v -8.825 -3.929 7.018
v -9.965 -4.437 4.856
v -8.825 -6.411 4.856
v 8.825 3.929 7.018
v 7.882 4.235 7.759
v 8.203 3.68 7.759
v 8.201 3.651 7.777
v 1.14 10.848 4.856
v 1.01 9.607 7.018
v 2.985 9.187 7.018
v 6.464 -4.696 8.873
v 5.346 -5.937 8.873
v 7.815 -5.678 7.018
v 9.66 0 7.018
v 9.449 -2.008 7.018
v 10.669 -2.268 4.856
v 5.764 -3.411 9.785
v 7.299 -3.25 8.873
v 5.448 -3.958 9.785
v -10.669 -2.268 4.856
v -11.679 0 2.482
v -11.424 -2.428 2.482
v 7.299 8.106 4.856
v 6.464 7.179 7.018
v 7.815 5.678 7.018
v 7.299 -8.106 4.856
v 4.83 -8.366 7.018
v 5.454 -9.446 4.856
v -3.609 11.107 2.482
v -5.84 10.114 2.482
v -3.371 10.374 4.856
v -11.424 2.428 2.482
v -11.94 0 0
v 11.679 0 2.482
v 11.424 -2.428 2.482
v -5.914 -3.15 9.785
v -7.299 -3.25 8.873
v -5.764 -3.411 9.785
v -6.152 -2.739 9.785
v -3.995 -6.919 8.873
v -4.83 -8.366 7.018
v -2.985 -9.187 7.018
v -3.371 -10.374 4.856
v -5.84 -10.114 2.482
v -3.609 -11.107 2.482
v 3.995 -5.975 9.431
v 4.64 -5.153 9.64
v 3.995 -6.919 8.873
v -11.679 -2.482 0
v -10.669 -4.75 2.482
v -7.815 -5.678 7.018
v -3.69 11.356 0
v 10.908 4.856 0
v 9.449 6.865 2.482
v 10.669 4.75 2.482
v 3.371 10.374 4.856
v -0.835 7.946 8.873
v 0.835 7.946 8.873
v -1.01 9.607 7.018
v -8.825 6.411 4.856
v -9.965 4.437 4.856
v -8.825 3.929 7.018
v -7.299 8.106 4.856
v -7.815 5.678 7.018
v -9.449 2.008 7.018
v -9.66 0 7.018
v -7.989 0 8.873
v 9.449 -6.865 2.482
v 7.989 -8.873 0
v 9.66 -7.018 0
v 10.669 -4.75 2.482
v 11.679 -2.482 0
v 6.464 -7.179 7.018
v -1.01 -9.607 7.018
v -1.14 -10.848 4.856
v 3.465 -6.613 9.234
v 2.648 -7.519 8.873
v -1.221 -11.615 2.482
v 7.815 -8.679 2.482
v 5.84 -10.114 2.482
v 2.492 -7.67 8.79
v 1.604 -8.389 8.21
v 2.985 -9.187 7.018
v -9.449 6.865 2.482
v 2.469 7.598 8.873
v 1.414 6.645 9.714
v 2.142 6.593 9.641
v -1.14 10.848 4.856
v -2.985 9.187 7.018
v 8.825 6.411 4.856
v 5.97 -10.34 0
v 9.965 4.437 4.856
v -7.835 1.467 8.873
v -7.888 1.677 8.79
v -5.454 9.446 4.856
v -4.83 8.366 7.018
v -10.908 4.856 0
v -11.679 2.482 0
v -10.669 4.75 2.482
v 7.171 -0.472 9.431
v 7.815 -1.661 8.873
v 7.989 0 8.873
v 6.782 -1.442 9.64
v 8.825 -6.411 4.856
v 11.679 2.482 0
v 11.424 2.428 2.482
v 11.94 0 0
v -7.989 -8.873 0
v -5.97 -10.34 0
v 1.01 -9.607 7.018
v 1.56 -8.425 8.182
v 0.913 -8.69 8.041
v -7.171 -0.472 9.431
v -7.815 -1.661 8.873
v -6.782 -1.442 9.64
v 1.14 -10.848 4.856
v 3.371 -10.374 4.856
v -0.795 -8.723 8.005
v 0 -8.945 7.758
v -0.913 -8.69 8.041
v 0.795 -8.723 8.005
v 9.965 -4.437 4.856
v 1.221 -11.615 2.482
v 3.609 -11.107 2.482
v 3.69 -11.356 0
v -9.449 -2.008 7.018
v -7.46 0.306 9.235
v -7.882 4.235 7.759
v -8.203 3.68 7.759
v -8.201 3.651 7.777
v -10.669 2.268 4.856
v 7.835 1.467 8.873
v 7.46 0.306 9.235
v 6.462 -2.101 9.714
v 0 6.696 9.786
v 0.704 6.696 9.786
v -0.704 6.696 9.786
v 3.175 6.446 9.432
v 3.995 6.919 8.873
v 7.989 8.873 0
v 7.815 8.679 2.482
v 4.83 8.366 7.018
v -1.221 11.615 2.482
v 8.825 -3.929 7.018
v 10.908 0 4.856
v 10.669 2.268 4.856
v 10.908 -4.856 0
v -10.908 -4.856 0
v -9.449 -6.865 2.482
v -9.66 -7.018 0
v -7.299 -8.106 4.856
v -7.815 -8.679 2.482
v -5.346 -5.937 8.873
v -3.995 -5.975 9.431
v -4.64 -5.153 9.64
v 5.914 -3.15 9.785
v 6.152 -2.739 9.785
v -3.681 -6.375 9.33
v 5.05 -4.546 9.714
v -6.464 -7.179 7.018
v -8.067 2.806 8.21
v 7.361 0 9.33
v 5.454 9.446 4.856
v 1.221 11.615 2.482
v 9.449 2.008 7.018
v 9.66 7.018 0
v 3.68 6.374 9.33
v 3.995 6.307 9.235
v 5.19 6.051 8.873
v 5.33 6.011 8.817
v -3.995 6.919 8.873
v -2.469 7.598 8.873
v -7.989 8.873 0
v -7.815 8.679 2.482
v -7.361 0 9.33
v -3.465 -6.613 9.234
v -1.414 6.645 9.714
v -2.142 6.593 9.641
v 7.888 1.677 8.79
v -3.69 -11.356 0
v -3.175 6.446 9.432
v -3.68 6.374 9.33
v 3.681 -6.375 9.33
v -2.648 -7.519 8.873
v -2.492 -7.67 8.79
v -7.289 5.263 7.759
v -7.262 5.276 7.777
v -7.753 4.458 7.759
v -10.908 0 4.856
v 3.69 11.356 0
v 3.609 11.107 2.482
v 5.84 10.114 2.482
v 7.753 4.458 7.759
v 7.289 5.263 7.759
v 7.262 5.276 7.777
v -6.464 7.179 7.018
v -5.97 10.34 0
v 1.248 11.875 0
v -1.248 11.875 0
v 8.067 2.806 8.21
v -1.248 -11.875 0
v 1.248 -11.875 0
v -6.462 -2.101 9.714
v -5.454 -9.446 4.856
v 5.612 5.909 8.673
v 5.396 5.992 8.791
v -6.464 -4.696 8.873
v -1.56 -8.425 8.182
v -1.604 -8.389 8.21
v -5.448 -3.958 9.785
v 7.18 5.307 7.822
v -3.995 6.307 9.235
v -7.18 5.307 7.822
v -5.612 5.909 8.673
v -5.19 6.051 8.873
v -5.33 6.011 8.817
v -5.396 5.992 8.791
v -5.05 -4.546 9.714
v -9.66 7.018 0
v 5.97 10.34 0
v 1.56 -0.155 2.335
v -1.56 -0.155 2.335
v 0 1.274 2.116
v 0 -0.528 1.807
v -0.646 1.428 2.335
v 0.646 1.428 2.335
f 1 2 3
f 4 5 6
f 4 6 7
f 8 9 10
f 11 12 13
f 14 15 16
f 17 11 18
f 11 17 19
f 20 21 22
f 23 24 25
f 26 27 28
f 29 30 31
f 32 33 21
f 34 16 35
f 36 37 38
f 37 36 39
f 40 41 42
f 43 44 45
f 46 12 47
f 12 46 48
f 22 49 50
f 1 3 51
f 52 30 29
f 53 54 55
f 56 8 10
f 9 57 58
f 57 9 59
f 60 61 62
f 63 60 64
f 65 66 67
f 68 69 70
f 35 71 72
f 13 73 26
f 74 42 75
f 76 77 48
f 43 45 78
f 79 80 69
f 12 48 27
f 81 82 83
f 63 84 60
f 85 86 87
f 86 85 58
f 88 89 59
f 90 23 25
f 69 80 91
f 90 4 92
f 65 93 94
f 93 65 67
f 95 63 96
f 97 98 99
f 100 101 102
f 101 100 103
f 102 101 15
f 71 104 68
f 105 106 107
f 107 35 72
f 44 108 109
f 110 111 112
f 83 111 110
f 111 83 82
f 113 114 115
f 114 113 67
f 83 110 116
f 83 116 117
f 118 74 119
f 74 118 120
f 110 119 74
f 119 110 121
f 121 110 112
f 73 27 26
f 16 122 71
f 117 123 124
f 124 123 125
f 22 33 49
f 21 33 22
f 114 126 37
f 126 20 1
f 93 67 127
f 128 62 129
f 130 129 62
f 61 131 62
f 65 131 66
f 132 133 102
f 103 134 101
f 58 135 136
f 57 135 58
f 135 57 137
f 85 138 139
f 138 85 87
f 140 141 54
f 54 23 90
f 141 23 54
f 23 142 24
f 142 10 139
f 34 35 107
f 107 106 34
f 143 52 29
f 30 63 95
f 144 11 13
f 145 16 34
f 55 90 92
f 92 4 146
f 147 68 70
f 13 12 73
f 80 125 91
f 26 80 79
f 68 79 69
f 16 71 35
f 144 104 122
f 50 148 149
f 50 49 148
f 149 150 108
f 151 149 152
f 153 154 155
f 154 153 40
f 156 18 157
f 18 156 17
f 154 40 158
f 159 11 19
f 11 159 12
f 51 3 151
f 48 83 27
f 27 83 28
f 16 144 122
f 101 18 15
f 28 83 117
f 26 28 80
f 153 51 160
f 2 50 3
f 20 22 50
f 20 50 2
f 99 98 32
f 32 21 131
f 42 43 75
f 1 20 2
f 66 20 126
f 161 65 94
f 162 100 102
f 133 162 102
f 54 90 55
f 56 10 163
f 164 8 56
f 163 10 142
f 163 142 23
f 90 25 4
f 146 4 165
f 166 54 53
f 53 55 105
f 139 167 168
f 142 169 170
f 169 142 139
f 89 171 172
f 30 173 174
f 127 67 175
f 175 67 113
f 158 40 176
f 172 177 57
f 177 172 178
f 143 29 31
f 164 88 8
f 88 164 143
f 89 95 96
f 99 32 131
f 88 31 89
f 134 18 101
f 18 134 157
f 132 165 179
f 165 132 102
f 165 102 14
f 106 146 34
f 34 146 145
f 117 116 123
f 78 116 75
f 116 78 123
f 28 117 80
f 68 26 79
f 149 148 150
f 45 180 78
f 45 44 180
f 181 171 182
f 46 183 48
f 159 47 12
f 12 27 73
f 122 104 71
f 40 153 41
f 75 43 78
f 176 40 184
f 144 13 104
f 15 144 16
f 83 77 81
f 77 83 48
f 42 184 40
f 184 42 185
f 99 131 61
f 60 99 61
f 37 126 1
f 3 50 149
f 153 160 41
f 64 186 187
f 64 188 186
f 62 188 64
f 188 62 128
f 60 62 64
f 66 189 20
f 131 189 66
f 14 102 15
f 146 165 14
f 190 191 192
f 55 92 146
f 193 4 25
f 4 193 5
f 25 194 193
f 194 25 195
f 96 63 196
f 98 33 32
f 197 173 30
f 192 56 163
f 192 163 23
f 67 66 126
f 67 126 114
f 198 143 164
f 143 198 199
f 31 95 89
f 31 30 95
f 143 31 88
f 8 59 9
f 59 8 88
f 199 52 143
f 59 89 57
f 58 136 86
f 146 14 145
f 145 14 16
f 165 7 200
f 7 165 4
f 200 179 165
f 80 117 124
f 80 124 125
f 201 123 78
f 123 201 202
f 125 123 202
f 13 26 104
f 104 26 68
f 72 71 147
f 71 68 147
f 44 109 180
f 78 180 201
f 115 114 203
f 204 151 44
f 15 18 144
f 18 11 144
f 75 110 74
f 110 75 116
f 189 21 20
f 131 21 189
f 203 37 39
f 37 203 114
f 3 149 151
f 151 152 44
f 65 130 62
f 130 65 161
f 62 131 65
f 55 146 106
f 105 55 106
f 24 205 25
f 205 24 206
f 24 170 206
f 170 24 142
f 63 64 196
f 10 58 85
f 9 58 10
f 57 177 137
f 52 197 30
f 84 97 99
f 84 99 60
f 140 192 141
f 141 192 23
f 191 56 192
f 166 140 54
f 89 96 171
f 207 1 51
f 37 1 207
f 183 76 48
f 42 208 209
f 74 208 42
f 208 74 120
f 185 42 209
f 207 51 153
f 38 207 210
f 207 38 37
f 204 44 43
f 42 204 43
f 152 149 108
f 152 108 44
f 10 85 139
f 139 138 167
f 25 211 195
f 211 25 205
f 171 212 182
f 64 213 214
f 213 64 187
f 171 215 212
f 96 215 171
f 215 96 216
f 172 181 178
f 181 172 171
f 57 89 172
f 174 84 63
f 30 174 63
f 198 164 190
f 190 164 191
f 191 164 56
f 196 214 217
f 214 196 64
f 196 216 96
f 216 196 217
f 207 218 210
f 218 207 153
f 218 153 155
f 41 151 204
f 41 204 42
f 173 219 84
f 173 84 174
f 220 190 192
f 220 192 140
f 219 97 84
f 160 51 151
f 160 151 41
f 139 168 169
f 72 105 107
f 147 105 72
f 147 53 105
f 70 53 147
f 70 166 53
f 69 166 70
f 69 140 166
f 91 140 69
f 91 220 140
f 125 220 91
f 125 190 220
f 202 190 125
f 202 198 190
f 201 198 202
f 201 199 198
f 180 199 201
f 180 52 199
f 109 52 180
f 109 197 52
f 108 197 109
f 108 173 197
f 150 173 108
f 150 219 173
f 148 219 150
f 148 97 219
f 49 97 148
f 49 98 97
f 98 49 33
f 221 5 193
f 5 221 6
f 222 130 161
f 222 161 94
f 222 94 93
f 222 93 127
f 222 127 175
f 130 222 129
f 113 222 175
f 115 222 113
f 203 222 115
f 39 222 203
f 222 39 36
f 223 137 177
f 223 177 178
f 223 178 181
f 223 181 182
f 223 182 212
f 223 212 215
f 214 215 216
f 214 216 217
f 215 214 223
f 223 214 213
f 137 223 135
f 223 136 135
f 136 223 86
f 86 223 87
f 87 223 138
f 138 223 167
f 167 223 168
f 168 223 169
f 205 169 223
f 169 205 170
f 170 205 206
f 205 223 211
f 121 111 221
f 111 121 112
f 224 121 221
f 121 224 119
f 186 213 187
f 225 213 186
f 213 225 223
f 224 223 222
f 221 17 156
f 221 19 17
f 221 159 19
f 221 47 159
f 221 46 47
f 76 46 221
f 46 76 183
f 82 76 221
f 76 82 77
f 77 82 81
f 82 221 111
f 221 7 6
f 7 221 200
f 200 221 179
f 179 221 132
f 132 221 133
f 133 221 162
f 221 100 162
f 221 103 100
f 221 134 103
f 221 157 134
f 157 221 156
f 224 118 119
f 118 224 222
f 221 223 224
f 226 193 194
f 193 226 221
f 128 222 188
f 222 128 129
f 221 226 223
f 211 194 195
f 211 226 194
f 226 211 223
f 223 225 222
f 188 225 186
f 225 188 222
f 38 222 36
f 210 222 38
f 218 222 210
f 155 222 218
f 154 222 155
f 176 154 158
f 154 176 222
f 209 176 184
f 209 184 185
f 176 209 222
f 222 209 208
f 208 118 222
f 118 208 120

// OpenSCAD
//Coin trap: a 3D printed cage to hold a coin
//by Matt
//v. 0.1, 16 Nov 2018
//v. 0.2, 19 Nov 2018
//v. 0.3, 21 Nov 2018

//parameters --------------------------------------------------
//$fa=1;
//$fs=1;
quarter_d = 23.88; //diameter of a quarter
quarter_th = 1.58; // thickness of a quarter
penny_d = 19.05; //thickness of a quarter
penny_th = 1.45; //thickness of a penny
gap=2;


//render ---------------------------------------------------------------
trap(quarter_d, quarter_th);
coin(quarter_d, quarter_th);
!base(quarter_d);

//modules-------------------------------------------------------
//the base
module base(quarter_d) {

    difference(){
        sphere(d=quarter_d);  
        translate([0,0,-quarter_d/2]) cube(size=quarter_d, center = true);
         rotate([54.74,0,0]){
            rotate([0,0,45]){
        translate([quarter_d/2,quarter_d/2,quarter_d*.5]) {    
            minkowski() {
                cube(size=.8*quarter_d, center = true);
                sphere(r=.1*quarter_d);
    }        
    }
}
}
}
}

//the coin
module coin(quarter_d,quarter_th) {
   %cylinder(r=quarter_d/2, h=quarter_th, center = true); 
}



//the trap

module trap(quarter_d, quarter_th) {
difference() {
    minkowski() {
    cube(size=.8*quarter_d, center = true);
    sphere(r=.1*quarter_d);
    }        
    cylinder(r=quarter_d/3, h= quarter_d*1.5, center=true);
    rotate([90,0,0]) { 
        cylinder(r=quarter_d/3, h= quarter_d*1.5, center=true);
    }
    rotate([0,90,0]) { 
        cylinder(r=quarter_d/3, h= quarter_d*1.5, center=true);
    }
    sphere(d=quarter_d+gap);
    translate([quarter_d*.85,0,0]) sphere(r=quarter_d/2);
    translate([0,quarter_d*.85,0]) sphere(r=quarter_d/2);
    translate([0,0,quarter_d*.85]) sphere(r=quarter_d/2);
    translate([0,0,-quarter_d*.85]) sphere(r=quarter_d/2);
    translate([0,-quarter_d*.85,0]) sphere(r=quarter_d/2);
    translate([-quarter_d*.85,0,0]) sphere(r=quarter_d/2);
}
}
